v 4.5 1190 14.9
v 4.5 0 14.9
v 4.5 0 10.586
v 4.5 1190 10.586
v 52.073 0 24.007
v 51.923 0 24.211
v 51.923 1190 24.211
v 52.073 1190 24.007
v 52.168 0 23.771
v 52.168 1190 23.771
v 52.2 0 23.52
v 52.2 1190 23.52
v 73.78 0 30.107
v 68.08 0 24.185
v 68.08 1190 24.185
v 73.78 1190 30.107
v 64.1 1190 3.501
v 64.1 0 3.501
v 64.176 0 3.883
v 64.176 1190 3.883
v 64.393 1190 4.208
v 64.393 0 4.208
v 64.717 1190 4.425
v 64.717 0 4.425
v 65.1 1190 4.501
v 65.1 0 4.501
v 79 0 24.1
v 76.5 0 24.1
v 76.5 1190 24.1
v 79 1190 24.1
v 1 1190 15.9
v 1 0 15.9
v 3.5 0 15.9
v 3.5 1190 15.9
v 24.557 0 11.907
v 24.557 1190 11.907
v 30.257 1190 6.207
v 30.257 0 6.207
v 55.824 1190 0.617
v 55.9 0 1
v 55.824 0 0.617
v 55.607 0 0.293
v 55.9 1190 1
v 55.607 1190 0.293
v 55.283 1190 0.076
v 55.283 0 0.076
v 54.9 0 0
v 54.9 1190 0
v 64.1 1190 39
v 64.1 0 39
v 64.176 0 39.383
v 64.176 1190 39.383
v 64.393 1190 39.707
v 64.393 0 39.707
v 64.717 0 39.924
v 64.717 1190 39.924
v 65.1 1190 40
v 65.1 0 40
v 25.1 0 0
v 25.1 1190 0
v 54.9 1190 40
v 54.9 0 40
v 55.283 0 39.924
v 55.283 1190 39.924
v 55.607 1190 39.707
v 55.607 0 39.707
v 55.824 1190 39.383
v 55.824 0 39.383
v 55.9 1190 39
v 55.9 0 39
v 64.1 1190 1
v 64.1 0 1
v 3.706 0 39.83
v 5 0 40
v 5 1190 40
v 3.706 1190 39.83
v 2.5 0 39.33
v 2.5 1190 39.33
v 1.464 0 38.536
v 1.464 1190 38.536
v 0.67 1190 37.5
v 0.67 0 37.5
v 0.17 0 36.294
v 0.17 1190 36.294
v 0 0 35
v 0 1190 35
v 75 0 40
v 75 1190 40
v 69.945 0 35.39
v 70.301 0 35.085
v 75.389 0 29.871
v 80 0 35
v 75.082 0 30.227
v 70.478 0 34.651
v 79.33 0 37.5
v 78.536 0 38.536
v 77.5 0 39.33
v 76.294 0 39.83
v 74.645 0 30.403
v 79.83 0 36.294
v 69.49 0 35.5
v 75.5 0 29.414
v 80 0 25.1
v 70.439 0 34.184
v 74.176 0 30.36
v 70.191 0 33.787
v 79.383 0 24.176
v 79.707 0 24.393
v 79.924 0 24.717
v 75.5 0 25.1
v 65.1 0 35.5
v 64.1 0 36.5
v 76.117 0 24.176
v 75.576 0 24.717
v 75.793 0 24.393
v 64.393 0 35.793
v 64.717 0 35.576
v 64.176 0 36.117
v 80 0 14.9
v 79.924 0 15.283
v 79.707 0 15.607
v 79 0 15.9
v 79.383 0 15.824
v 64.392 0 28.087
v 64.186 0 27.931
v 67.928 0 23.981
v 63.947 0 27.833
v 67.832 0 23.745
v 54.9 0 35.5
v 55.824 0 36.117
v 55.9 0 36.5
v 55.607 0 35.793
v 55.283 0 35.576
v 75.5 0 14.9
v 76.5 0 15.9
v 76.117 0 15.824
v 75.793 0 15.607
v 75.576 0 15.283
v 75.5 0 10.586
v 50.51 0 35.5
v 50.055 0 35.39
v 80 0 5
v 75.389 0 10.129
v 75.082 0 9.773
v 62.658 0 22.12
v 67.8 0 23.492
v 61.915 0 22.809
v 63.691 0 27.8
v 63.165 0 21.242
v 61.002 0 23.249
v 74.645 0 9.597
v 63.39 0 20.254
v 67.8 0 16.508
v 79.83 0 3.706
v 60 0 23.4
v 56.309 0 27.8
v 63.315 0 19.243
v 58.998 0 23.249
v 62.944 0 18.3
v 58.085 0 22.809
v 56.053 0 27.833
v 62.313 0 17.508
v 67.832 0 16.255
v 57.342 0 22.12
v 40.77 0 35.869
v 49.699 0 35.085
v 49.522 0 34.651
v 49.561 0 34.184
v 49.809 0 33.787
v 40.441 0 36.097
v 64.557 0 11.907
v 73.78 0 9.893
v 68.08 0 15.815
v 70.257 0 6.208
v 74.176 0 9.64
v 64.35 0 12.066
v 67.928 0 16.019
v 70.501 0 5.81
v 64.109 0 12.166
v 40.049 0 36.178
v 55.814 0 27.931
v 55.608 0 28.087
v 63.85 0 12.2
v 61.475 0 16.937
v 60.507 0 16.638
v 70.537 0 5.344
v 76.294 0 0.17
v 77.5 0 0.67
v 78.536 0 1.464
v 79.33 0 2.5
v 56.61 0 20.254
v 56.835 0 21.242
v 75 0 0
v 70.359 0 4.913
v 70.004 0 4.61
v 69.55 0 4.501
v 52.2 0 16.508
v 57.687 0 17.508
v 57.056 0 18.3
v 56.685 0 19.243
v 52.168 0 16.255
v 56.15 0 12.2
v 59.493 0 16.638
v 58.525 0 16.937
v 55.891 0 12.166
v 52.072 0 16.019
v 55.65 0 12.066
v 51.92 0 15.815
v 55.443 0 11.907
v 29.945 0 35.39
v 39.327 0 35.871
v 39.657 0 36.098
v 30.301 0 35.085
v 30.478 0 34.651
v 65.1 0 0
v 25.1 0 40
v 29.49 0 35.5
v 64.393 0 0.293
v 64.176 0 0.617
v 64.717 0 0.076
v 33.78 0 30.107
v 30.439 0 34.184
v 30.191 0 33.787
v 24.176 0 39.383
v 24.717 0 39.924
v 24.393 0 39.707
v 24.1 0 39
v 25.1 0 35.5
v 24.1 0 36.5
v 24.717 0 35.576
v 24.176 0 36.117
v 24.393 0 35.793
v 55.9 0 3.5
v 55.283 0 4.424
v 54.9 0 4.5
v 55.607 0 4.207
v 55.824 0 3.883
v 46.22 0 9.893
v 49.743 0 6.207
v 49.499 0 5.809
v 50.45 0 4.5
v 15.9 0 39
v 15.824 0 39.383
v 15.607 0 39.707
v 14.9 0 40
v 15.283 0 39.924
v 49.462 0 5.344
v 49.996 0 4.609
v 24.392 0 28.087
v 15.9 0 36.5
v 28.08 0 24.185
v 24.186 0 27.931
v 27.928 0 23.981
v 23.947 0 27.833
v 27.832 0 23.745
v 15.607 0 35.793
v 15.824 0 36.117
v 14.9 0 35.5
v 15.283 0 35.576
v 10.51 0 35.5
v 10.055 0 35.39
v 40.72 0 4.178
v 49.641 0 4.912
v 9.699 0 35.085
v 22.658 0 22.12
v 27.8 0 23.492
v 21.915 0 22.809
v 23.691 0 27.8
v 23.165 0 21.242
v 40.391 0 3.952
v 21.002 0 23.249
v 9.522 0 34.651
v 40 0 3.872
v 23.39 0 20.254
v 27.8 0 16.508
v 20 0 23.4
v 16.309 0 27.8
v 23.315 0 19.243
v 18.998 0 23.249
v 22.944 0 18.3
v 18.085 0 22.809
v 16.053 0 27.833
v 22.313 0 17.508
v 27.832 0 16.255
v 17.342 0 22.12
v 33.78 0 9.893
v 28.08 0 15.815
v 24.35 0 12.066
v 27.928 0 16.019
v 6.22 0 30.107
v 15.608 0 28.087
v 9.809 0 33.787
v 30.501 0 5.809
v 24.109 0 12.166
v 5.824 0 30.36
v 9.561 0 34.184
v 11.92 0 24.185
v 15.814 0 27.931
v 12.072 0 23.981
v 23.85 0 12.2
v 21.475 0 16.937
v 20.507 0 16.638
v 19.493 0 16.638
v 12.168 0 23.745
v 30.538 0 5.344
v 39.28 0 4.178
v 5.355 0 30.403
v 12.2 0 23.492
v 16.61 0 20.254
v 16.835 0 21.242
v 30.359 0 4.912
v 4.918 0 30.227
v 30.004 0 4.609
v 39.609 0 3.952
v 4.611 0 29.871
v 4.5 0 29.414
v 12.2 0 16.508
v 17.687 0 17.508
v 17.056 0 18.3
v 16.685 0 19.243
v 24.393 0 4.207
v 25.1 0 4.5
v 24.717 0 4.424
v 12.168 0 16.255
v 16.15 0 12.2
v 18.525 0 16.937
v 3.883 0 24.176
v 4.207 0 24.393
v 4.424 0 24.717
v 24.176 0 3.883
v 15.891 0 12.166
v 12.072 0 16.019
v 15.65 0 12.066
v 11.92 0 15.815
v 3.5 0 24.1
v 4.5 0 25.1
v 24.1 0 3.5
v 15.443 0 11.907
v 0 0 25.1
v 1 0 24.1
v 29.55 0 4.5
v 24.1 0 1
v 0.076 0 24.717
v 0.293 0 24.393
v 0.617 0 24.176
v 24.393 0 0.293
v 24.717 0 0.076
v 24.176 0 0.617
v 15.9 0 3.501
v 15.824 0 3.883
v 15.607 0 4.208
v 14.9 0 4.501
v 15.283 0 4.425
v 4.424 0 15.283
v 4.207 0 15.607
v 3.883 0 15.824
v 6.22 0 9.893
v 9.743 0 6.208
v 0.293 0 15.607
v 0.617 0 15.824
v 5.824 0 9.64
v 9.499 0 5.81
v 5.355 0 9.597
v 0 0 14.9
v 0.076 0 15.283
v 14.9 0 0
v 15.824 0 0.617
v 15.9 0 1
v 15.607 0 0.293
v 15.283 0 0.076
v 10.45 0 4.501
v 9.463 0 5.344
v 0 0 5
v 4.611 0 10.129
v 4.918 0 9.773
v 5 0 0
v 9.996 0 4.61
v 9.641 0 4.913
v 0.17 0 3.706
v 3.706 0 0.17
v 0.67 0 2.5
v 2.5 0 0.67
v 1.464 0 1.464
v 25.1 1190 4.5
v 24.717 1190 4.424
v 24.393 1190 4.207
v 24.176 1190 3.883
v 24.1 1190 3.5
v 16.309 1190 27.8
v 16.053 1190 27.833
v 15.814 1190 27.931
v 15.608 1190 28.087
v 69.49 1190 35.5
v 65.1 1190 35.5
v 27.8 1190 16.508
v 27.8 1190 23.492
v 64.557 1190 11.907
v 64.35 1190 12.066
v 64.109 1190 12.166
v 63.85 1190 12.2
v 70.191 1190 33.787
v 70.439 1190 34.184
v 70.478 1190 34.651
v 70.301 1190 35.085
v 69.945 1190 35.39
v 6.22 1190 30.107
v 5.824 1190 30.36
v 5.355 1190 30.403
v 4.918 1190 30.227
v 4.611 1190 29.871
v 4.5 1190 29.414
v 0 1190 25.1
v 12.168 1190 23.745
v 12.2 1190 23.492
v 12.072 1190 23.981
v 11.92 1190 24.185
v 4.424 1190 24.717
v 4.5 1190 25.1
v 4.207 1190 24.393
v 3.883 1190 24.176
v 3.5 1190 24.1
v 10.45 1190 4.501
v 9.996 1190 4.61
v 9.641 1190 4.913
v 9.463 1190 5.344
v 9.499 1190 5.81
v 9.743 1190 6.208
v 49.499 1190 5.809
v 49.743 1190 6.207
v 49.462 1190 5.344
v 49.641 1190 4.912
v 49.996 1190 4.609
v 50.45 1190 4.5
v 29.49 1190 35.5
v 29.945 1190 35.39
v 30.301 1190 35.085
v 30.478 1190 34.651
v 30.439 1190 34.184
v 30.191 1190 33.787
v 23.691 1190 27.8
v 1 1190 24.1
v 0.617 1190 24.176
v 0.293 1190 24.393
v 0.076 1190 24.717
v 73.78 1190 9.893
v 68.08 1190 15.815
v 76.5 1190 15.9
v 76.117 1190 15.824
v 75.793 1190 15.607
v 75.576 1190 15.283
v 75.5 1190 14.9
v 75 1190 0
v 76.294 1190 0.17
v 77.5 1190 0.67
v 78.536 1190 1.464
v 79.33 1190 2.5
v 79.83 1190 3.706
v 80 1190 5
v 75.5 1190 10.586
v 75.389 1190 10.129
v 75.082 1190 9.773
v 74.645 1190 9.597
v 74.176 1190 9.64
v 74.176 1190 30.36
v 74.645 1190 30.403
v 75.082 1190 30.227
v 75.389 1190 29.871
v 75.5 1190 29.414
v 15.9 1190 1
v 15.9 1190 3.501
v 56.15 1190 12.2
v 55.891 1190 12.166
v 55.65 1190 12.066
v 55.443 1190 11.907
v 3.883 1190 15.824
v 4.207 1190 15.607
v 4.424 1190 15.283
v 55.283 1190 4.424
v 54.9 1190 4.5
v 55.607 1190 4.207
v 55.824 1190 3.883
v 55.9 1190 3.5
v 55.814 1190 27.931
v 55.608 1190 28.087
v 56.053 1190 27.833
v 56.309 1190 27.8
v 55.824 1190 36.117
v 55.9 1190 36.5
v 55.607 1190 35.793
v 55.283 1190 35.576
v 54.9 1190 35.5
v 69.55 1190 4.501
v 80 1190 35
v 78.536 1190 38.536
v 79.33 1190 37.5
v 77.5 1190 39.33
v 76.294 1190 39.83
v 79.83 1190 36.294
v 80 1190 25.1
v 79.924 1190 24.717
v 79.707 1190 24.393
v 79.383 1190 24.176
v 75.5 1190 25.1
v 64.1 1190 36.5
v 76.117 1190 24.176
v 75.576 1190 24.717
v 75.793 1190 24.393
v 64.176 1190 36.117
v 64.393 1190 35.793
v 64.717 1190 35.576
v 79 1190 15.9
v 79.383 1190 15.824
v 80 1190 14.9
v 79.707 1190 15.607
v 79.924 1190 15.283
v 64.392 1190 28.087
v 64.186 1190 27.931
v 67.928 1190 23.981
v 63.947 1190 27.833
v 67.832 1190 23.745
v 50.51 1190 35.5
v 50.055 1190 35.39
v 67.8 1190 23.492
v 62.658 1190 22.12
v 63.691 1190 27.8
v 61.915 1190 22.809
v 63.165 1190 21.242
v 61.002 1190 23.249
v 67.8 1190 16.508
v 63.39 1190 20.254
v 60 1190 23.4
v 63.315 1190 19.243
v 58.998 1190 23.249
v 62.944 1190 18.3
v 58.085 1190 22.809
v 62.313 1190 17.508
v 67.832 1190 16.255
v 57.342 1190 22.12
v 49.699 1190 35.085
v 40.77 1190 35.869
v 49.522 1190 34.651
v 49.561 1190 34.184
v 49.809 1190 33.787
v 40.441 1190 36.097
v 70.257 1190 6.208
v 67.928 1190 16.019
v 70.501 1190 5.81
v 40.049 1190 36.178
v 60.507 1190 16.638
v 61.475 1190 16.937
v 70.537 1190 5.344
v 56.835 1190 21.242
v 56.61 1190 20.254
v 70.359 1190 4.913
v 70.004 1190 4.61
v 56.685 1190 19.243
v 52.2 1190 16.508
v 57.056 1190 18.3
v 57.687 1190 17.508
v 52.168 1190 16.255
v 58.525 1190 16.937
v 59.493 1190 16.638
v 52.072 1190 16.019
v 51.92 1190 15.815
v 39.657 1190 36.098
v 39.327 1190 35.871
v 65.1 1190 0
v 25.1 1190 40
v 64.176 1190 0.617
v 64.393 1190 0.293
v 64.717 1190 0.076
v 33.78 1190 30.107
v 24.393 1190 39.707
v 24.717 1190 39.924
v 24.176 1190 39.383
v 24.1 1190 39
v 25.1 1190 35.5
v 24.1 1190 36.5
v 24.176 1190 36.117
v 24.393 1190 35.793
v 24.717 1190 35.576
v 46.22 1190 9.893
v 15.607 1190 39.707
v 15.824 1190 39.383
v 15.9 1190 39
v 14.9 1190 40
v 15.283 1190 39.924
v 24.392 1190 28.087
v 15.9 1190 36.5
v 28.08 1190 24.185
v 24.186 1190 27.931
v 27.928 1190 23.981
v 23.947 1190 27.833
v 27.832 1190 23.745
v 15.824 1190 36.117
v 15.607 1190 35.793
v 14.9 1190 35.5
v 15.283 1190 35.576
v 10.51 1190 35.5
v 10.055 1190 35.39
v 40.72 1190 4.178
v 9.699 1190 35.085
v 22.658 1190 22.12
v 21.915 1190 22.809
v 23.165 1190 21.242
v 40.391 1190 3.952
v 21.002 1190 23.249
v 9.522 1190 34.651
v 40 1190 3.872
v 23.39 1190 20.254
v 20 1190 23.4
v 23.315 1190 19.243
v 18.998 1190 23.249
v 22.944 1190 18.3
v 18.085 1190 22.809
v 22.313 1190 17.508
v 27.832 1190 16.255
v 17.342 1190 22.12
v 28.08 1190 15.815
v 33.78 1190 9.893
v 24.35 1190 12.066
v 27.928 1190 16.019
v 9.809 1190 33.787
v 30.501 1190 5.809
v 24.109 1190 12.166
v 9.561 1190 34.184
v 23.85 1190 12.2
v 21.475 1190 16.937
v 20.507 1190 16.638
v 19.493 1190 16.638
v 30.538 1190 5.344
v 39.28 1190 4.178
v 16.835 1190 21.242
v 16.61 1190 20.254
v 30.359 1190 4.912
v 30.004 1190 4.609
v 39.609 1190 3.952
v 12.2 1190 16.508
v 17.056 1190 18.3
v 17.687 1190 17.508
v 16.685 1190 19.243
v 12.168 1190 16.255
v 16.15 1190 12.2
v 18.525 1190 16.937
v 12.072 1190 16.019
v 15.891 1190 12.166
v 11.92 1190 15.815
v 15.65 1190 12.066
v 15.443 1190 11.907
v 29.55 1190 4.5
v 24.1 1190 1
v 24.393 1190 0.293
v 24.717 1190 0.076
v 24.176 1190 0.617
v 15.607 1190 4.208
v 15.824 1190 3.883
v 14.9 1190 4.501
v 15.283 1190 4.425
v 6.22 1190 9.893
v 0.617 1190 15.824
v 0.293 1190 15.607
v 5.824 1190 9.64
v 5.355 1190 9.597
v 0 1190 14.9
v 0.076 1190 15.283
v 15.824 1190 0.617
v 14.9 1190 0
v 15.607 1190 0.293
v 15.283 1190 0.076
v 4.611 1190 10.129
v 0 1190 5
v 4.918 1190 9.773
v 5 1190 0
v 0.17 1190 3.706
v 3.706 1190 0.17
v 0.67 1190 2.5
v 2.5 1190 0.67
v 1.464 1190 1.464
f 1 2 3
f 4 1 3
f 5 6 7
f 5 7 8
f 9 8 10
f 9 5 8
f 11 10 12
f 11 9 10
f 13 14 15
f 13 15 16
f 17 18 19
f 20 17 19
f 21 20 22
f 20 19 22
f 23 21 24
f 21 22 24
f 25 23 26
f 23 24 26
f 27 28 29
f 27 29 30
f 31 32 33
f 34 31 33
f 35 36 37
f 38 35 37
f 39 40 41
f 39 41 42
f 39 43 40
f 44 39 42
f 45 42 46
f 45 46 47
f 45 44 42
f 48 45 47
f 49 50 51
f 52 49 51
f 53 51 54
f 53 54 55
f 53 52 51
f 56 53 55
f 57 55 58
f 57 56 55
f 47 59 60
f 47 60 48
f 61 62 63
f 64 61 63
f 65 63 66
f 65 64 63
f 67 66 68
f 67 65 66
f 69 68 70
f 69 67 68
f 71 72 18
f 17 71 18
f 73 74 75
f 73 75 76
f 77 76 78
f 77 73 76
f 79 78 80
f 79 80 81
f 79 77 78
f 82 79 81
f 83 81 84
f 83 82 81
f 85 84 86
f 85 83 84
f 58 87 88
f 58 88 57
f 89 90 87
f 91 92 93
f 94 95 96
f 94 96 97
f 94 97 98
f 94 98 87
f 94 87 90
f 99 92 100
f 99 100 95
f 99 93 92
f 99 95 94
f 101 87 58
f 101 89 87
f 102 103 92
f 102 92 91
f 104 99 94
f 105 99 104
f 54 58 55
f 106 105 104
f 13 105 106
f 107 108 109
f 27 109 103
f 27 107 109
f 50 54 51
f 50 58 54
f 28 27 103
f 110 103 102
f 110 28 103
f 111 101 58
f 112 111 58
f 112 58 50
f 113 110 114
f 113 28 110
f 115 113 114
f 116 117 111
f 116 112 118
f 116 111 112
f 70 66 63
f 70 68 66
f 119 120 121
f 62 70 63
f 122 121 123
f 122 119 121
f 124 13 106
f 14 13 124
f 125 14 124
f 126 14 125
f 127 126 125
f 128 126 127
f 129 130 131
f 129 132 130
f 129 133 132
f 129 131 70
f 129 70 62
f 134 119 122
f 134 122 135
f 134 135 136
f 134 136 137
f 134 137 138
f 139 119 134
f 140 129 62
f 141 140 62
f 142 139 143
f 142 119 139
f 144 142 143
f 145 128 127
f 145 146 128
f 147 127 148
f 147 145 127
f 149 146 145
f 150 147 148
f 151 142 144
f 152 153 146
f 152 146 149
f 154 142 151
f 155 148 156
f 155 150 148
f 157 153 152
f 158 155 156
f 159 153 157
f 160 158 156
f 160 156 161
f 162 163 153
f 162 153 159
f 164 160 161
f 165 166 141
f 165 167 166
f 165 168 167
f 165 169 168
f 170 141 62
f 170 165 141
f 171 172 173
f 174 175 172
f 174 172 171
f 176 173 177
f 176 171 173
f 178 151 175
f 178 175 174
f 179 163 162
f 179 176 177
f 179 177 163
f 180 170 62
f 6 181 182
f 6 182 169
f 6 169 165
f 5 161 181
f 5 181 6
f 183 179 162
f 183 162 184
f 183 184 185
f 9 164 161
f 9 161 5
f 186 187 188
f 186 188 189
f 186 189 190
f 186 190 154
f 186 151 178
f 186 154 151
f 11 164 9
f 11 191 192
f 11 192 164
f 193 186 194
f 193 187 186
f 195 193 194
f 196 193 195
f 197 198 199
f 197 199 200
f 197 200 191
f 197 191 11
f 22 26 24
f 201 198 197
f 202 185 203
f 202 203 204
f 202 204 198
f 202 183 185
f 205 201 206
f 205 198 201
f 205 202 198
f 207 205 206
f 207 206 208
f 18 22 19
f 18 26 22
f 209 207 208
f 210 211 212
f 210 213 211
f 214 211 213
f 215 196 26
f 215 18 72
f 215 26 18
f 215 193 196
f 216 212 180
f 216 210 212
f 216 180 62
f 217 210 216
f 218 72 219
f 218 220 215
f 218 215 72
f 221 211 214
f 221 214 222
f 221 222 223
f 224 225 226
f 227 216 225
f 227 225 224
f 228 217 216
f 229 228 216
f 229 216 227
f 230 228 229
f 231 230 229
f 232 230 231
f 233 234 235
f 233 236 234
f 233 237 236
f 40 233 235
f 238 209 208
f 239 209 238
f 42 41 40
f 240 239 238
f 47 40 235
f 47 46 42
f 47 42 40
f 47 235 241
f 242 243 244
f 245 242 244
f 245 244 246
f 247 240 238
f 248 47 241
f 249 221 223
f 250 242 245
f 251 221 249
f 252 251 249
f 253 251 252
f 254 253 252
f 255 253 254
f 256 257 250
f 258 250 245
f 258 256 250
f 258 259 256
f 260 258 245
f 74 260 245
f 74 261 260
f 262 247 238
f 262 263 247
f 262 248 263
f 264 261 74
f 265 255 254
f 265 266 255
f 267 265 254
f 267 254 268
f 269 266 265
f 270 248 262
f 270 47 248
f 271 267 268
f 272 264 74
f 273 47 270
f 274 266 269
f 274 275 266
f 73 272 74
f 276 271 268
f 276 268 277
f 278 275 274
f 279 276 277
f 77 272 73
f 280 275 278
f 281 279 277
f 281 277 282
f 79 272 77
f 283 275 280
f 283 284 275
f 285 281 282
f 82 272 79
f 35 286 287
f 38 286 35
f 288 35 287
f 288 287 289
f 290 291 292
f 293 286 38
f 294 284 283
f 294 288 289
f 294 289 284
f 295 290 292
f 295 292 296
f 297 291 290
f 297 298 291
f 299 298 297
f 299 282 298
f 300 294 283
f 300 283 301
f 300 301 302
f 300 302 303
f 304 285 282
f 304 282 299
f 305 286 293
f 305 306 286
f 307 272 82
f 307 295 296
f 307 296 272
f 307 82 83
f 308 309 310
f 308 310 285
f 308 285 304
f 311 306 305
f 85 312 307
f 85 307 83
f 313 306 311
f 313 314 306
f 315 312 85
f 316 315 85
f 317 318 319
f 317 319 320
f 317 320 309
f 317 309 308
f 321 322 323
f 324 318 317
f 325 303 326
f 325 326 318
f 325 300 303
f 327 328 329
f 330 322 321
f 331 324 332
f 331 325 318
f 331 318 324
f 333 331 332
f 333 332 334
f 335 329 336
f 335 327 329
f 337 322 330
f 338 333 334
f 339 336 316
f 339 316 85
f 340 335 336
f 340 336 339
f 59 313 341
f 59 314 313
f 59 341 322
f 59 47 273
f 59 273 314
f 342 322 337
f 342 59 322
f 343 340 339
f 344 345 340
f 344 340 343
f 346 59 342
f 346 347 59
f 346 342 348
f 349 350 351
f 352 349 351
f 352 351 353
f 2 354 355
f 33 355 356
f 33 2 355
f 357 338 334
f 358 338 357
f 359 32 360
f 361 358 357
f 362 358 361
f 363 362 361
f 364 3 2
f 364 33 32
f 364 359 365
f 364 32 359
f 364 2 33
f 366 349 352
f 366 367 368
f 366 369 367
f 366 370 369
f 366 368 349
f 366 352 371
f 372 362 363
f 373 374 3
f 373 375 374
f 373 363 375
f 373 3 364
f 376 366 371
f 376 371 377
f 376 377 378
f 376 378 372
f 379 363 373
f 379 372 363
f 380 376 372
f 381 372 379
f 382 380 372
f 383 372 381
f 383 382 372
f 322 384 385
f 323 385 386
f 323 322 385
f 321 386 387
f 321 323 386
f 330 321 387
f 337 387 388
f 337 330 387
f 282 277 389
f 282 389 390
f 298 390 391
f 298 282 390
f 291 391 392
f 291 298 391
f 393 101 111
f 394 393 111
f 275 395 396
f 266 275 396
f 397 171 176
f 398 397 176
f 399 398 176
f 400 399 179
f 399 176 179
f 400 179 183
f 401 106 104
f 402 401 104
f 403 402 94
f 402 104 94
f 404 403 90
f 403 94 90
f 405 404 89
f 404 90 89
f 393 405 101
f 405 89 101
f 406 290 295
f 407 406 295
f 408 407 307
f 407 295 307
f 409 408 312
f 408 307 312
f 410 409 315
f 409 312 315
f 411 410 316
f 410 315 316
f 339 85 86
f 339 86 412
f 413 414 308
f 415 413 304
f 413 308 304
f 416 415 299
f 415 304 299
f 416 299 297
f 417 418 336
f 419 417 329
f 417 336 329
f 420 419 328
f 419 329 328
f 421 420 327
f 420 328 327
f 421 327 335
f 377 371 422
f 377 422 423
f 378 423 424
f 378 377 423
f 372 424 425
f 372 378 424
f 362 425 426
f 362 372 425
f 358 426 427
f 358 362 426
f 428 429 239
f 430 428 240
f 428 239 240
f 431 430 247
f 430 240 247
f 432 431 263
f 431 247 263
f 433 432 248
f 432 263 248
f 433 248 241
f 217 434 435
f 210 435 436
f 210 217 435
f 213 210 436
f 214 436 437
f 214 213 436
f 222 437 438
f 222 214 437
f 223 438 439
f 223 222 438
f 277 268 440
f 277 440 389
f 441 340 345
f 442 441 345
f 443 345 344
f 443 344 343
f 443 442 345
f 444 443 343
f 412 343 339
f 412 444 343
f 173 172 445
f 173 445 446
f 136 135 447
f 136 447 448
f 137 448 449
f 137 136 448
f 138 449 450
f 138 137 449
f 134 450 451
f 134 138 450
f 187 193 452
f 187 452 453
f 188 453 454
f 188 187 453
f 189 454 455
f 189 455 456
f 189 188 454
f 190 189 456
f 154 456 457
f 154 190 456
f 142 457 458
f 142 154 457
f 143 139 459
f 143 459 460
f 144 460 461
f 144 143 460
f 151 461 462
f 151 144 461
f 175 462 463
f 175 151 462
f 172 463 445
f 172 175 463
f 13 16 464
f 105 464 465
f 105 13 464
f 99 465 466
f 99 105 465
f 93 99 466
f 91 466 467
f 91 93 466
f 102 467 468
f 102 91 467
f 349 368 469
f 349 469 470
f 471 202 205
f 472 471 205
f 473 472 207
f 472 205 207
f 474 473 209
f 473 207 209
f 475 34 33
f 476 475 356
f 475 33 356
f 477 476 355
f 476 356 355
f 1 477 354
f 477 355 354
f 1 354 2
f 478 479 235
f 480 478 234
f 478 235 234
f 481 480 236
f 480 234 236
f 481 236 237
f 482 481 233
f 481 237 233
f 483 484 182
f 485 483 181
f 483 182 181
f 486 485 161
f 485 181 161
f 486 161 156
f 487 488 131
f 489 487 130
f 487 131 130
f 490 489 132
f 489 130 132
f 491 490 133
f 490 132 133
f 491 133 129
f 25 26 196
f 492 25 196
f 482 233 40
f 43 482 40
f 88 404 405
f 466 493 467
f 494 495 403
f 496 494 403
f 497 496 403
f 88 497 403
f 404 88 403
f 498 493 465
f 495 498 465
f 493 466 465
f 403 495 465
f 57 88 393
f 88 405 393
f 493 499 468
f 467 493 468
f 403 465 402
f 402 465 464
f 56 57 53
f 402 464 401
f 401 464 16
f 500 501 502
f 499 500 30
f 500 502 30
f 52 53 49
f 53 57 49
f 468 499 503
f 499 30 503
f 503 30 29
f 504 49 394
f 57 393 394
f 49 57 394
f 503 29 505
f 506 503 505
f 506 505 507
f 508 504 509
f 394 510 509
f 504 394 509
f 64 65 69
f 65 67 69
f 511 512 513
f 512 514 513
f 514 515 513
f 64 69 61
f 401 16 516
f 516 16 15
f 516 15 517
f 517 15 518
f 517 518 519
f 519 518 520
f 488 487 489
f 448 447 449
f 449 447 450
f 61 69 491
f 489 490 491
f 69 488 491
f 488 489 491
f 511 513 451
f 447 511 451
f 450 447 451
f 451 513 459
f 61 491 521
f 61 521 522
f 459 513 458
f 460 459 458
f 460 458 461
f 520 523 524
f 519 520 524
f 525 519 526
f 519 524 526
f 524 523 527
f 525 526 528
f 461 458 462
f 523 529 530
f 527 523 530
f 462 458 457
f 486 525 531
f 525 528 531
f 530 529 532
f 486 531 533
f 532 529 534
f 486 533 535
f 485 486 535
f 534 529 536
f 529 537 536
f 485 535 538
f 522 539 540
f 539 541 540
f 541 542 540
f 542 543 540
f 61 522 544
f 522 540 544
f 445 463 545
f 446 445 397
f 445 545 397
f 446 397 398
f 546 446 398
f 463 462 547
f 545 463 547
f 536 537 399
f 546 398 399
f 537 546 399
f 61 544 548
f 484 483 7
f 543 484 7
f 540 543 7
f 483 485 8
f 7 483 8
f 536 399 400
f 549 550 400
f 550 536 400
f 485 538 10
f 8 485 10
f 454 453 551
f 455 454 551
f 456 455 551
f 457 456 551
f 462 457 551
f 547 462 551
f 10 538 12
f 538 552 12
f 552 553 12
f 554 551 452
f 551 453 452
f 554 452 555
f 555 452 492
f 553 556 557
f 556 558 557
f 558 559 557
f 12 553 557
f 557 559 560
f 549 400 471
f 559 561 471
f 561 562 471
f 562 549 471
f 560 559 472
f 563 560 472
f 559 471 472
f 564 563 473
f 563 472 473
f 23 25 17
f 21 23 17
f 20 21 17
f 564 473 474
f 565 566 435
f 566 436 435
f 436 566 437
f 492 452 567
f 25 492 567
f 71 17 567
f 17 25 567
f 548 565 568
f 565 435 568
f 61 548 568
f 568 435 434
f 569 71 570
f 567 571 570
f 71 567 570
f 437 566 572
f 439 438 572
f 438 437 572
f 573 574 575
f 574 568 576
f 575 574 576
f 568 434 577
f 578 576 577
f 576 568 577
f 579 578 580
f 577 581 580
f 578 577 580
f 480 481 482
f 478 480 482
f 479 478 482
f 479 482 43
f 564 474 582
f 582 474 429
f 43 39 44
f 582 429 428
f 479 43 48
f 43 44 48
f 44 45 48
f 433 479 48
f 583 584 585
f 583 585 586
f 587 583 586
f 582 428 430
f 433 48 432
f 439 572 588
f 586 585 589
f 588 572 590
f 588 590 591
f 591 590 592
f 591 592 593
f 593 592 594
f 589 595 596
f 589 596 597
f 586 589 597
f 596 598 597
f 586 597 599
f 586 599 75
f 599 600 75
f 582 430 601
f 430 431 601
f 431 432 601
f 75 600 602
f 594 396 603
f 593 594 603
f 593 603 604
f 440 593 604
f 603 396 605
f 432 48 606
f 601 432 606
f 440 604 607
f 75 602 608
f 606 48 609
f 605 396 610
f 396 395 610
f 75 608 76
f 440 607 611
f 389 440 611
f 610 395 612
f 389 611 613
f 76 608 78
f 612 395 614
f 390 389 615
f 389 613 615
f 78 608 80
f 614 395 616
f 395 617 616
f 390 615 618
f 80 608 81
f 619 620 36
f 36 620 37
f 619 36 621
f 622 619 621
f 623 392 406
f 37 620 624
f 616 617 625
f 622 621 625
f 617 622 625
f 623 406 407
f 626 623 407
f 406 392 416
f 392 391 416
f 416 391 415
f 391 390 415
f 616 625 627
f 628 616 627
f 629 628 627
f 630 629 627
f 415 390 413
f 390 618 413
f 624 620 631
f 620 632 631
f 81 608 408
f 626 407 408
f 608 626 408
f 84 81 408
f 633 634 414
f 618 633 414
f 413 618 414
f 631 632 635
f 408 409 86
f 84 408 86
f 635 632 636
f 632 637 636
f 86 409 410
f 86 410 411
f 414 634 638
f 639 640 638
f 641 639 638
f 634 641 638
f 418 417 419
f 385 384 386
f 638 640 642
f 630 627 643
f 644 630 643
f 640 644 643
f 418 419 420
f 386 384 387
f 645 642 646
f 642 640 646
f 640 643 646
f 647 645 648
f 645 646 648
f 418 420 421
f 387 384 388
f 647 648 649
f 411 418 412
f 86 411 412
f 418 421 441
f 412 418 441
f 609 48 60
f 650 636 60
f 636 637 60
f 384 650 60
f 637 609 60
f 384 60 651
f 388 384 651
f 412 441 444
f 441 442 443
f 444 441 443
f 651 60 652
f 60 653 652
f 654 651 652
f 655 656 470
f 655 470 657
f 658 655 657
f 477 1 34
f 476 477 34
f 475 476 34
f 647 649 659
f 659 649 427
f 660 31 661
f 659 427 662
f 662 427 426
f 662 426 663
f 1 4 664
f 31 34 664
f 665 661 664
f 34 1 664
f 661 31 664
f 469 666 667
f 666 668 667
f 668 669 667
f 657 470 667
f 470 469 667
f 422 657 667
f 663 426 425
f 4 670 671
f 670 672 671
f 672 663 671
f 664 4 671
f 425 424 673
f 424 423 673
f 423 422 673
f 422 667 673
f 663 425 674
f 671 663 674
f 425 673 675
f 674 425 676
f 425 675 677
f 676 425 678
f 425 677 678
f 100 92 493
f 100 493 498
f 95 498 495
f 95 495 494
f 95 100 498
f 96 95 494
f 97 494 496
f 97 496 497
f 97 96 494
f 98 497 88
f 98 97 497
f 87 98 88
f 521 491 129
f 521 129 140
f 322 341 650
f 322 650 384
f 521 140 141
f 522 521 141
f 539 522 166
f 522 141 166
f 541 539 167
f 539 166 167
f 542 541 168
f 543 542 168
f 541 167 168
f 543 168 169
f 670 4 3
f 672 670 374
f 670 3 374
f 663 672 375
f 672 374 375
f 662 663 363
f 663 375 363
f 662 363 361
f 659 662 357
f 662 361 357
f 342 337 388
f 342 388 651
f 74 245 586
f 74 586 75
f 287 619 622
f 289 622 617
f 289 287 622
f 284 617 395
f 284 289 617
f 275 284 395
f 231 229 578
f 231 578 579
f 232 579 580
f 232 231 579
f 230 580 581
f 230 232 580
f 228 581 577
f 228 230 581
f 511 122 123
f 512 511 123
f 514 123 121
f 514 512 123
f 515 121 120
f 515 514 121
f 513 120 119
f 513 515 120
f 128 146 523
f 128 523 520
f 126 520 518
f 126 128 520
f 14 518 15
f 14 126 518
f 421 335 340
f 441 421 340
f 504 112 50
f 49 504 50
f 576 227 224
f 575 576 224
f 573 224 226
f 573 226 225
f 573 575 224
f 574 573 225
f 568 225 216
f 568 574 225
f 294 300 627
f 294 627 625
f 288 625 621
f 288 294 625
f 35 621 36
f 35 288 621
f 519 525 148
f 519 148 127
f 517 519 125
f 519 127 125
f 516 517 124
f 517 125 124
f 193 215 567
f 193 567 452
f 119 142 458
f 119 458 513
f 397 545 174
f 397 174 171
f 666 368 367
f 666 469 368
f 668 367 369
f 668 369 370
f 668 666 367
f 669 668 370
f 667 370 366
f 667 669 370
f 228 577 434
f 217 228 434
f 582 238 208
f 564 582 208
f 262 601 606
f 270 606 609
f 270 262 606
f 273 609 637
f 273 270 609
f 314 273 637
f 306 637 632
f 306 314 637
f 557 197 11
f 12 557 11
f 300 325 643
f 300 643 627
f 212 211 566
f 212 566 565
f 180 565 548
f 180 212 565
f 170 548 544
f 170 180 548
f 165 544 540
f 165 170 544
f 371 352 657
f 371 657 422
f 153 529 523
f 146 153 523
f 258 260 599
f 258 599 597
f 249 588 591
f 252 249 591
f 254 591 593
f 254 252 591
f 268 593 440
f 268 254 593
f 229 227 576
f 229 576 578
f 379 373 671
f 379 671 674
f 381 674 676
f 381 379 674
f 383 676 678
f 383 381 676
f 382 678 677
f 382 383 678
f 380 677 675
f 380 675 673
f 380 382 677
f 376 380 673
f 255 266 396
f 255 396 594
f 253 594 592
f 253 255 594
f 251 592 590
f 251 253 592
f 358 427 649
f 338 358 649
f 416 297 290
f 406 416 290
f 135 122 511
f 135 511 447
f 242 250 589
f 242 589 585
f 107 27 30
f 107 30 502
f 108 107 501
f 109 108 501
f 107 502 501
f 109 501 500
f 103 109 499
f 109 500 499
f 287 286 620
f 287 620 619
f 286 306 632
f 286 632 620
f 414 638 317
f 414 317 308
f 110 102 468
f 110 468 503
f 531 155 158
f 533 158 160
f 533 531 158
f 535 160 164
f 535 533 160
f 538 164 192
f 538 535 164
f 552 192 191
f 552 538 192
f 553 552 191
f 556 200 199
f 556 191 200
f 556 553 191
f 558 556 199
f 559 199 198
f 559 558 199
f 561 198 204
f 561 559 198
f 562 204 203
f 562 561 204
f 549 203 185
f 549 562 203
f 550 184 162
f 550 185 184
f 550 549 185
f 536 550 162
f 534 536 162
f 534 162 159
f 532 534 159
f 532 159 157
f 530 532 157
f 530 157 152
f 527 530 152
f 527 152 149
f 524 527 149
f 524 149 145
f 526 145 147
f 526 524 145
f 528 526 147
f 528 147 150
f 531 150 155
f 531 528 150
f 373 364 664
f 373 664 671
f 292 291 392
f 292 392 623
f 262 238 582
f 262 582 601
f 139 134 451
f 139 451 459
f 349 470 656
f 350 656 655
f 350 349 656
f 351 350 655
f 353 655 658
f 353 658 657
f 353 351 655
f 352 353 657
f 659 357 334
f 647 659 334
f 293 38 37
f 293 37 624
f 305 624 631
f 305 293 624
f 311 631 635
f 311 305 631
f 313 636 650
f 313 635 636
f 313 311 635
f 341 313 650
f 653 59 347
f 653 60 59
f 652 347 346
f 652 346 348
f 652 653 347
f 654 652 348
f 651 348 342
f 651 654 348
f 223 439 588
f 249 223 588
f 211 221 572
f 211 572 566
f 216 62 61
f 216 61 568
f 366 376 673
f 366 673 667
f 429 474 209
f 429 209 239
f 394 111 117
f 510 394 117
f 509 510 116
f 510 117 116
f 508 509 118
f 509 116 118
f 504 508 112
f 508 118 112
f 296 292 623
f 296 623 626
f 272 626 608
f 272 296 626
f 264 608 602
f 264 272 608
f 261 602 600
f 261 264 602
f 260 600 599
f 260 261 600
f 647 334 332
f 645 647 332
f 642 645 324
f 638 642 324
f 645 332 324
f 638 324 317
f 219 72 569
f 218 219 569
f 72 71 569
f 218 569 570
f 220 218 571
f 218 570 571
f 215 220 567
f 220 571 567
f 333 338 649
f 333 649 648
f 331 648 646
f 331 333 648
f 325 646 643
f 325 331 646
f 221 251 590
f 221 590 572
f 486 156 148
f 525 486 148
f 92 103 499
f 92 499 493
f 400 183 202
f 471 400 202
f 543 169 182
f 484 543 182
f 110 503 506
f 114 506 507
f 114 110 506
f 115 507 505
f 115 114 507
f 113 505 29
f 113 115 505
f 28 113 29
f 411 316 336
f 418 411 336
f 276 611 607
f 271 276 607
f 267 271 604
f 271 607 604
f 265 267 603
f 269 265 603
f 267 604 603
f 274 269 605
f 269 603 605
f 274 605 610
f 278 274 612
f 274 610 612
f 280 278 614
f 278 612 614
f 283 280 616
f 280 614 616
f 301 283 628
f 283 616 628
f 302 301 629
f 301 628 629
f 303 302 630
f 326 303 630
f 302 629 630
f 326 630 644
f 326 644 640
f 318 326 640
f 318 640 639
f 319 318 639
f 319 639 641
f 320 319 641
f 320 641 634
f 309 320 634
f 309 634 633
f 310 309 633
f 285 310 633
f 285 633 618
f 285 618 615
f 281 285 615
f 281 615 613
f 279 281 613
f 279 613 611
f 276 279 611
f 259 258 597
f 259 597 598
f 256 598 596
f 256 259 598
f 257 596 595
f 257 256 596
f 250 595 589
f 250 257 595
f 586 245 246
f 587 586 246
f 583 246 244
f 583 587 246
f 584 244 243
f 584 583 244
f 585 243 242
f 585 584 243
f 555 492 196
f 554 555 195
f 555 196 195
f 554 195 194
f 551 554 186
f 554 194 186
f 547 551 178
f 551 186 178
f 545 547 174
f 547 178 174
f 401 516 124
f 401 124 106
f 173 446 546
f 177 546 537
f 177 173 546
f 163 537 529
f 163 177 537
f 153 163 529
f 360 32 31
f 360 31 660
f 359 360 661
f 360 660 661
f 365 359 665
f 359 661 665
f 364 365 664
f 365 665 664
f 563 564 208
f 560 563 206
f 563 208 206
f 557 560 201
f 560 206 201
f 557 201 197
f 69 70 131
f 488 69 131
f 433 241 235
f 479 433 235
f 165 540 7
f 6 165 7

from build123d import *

# Parameters (mm, degrees)
BOSS_EXTRUDE1_DEPTH   = 1190
SKETCH3_R             = 3.4
CUT_EXTRUDE1_DEPTH    = 1194.356610574
CUT_EXTRUDE2_DEPTH    = 1194.356610574
FILLET1_R             = 1
FILLET2_R             = 1
FILLET3_R             = 1
CUT_EXTRUDE3_DEPTH    = 1194.356610574
CUT_EXTRUDE4_DEPTH    = 1194.356610574
FILLET4_R             = 1
FILLET5_R             = 1
FILLET6_R             = 1
FILLET7_R             = 1
FILLET8_R             = 1
FILLET9_R             = 1
FILLET10_R            = 1
FILLET11_R            = 1
MIRROR11_COPY_1_DEPTH = 1194.356610574
MIRROR11_COPY_2_DEPTH = 1194.356610574
CUT_EXTRUDE5_DEPTH    = 1194.356610574


with BuildPart() as part:
    # Sketch1 → Boss-Extrude1 (new body)
    with BuildSketch(Plane(origin=(0, 0, 0), x_dir=(1, 0, 0), z_dir=(0, 1, 0))):
        with BuildLine():
            Line((5, 0), (75, 0))
            ThreePointArc((75, 0), (78.535533906, -1.464466094), (80, -5))
            Line((80, -5), (80, -35))
            ThreePointArc((80, -35), (78.535533906, -38.535533906), (75, -40))
            Line((75, -40), (5, -40))
            ThreePointArc((5, -40), (1.464466094, -38.535533906), (0, -35))
            Line((0, -35), (0, -5))
            ThreePointArc((0, -5), (1.464466094, -1.464466094), (5, 0))
        make_face()
    extrude(amount=BOSS_EXTRUDE1_DEPTH)

    # Sketch3 → Cut-Extrude1 (cut, through all)
    with BuildSketch(Plane(origin=(0, 1190, 0), x_dir=(1, 0, 0), z_dir=(0, 1, 0))):
        with Locations(Location((20, -20, 0), (0, 0, 270))):
            Circle(SKETCH3_R)
    cut_extrude1 = extrude(amount=-CUT_EXTRUDE1_DEPTH, mode=Mode.SUBTRACT)

    # Mirror3: Cut-Extrude1 across plane
    add(cut_extrude1.mirror(Plane(origin=(40, 0, 0), x_dir=(0, 0, 1), z_dir=(1, 0, 0))), mode=Mode.SUBTRACT)

    # Sketch7 → Cut-Extrude2 (cut, through all)
    with BuildSketch(Plane(origin=(0, 0, 0), x_dir=(-1, 0, 0), z_dir=(0, -1, 0))):
        with BuildLine():
            Line((-15.9, -40), (-24.1, -40))
            Line((-24.1, -40), (-24.1, -36.5))
            ThreePointArc((-24.1, -36.5), (-24.392893219, -35.792893219), (-25.1, -35.5))
            Line((-25.1, -35.5), (-29.489753594, -35.5))
            ThreePointArc((-29.489753594, -35.5), (-30.415270825, -34.8787055), (-30.190750526, -33.786835712))
            Line((-30.190750526, -33.786835712), (-24.391814382, -28.086835712))
            ThreePointArc((-24.391814382, -28.086835712), (-24.069522951, -27.874482769), (-23.69081745, -27.8))
            Line((-23.69081745, -27.8), (-16.309186536, -27.8))
            ThreePointArc((-16.309186536, -27.8), (-15.930477876, -27.874484063), (-15.608184734, -28.086840499))
            Line((-15.608184734, -28.086840499), (-9.809327805, -33.786840499))
            ThreePointArc((-9.809327805, -33.786840499), (-9.584813669, -34.87870866), (-10.510329607, -35.5))
            Line((-10.510329607, -35.5), (-14.9, -35.5))
            ThreePointArc((-14.9, -35.5), (-15.607106781, -35.792893219), (-15.9, -36.5))
            Line((-15.9, -36.5), (-15.9, -40))
        make_face()
    cut_extrude2 = extrude(amount=-CUT_EXTRUDE2_DEPTH, mode=Mode.SUBTRACT)

    # Fillet1
    fillet1_edges = [part.edges().sort_by_distance(p)[0] for p in [
        (15.9, 595, 40),
        (24.1, 595, 40),
    ]]
    fillet(fillet1_edges, radius=FILLET1_R)

    # Mirror8: Cut-Extrude2 across plane
    add(cut_extrude2.mirror(Plane(origin=(40, 0, 0), x_dir=(0, 0, 1), z_dir=(1, 0, 0))), mode=Mode.SUBTRACT)

    # Fillet2
    fillet2_edges = [part.edges().sort_by_distance(p)[0] for p in [
        (55.9, 595, 40),
    ]]
    fillet(fillet2_edges, radius=FILLET2_R)

    # Fillet3
    fillet3_edges = [part.edges().sort_by_distance(p)[0] for p in [
        (64.1, 595, 40),
    ]]
    fillet(fillet3_edges, radius=FILLET3_R)

    # Sketch9 → Cut-Extrude3 (cut, through all)
    with BuildSketch(Plane(origin=(0, 0, 0), x_dir=(1, 0, 0), z_dir=(0, 1, 0))):
        with BuildLine():
            Line((14.899846923, -4.500713815), (10.450461284, -4.500713815))
            ThreePointArc((10.450461284, -4.500713815), (9.526581751, -5.118030383), (9.743354502, -6.207820596))
            Line((9.743354502, -6.207820596), (15.442640687, -11.907106781))
            ThreePointArc((15.442640687, -11.907106781), (15.767064036, -12.123879533), (16.149747468, -12.2))
            Line((16.149747468, -12.2), (23.850252532, -12.2))
            ThreePointArc((23.850252532, -12.2), (24.232935964, -12.123879533), (24.557359313, -11.907106781))
            Line((24.557359313, -11.907106781), (30.257359313, -6.207106781))
            ThreePointArc((30.257359313, -6.207106781), (30.474132064, -5.117316568), (29.550252532, -4.5))
            Line((29.550252532, -4.5), (25.099846964, -4.5))
            ThreePointArc((25.099846964, -4.5), (24.392724723, -4.207091321), (24.099846965, -3.499956273))
            Line((24.099846965, -3.499956273), (24.100000008, 0))
            Line((24.100000008, 0), (15.9, 0))
            Line((15.9, 0), (15.899846922, -3.500757542))
            ThreePointArc((15.899846922, -3.500757542), (15.606938244, -4.207836056), (14.899846923, -4.500713815))
        make_face()
    cut_extrude3 = extrude(amount=CUT_EXTRUDE3_DEPTH, mode=Mode.SUBTRACT)

    # Mirror9: Cut-Extrude3 across plane
    add(cut_extrude3.mirror(Plane(origin=(40, 0, 0), x_dir=(0, 0, 1), z_dir=(1, 0, 0))), mode=Mode.SUBTRACT)

    # Sketch10 → Cut-Extrude4 (cut, through all)
    with BuildSketch(Plane(origin=(0, 0, 0), x_dir=(1, 0, 0), z_dir=(0, 1, 0))):
        with BuildLine():
            Line((4.5, -14.9), (4.5, -10.58605332))
            ThreePointArc((4.5, -10.58605332), (5.126159695, -9.658560233), (6.220486853, -9.892584724))
            Line((6.220486853, -9.892584724), (11.920486853, -15.814662646))
            ThreePointArc((11.920486853, -15.814662646), (12.127493087, -16.134290938), (12.2, -16.508131242))
            Line((12.2, -16.508131242), (12.2, -23.491868758))
            ThreePointArc((12.2, -23.491868758), (12.127493087, -23.865709062), (11.920486853, -24.185337354))
            Line((11.920486853, -24.185337354), (6.220486853, -30.107415276))
            ThreePointArc((6.220486853, -30.107415276), (5.126159695, -30.341439767), (4.5, -29.41394668))
            Line((4.5, -29.41394668), (4.5, -25.1))
            ThreePointArc((4.5, -25.1), (4.207106781, -24.392893219), (3.5, -24.1))
            Line((3.5, -24.1), (0, -24.1))
            Line((0, -24.1), (0, -15.9))
            Line((0, -15.9), (3.5, -15.9))
            ThreePointArc((3.5, -15.9), (4.207106781, -15.607106781), (4.5, -14.9))
        make_face()
    cut_extrude4 = extrude(amount=CUT_EXTRUDE4_DEPTH, mode=Mode.SUBTRACT)

    # Fillet4
    fillet4_edges = [part.edges().sort_by_distance(p)[0] for p in [
        (24.100000008, 595, 0),
    ]]
    fillet(fillet4_edges, radius=FILLET4_R)

    # Fillet5
    fillet5_edges = [part.edges().sort_by_distance(p)[0] for p in [
        (64.1, 595, 0),
    ]]
    fillet(fillet5_edges, radius=FILLET5_R)

    # Fillet6
    fillet6_edges = [part.edges().sort_by_distance(p)[0] for p in [
        (55.899999992, 595, 0),
    ]]
    fillet(fillet6_edges, radius=FILLET6_R)

    # Fillet7
    fillet7_edges = [part.edges().sort_by_distance(p)[0] for p in [
        (15.9, 595, 0),
    ]]
    fillet(fillet7_edges, radius=FILLET7_R)

    # Fillet8
    fillet8_edges = [part.edges().sort_by_distance(p)[0] for p in [
        (0, 595, 24.1),
    ]]
    fillet(fillet8_edges, radius=FILLET8_R)

    # Fillet9
    fillet9_edges = [part.edges().sort_by_distance(p)[0] for p in [
        (0, 595, 15.9),
    ]]
    fillet(fillet9_edges, radius=FILLET9_R)

    # Mirror10: Cut-Extrude4 across plane
    add(cut_extrude4.mirror(Plane(origin=(40, 0, 0), x_dir=(0, 0, 1), z_dir=(1, 0, 0))), mode=Mode.SUBTRACT)

    # Fillet10
    fillet10_edges = [part.edges().sort_by_distance(p)[0] for p in [
        (80, 595, 15.9),
    ]]
    fillet(fillet10_edges, radius=FILLET10_R)

    # Fillet11
    fillet11_edges = [part.edges().sort_by_distance(p)[0] for p in [
        (80, 595, 24.1),
    ]]
    fillet(fillet11_edges, radius=FILLET11_R)

    # Mirror11 copy 1 sketch → Mirror11 copy 1 (cut, through all)
    with BuildSketch(Plane(origin=(40, 0, 0), x_dir=(1, 0, 0), z_dir=(0, 1, 0))):
        with BuildLine():
            Line((4.5, -14.9), (4.5, -10.58605332))
            ThreePointArc((4.5, -10.58605332), (5.126159695, -9.658560233), (6.220486853, -9.892584724))
            Line((6.220486853, -9.892584724), (11.920486853, -15.814662646))
            ThreePointArc((11.920486853, -15.814662646), (12.127493087, -16.134290938), (12.2, -16.508131242))
            Line((12.2, -16.508131242), (12.2, -23.491868758))
            ThreePointArc((12.2, -23.491868758), (12.127493087, -23.865709062), (11.920486853, -24.185337354))
            Line((11.920486853, -24.185337354), (6.220486853, -30.107415276))
            ThreePointArc((6.220486853, -30.107415276), (5.126159695, -30.341439767), (4.5, -29.41394668))
            Line((4.5, -29.41394668), (4.5, -25.1))
            ThreePointArc((4.5, -25.1), (4.207106781, -24.392893219), (3.5, -24.1))
            Line((3.5, -24.1), (0, -24.1))
            Line((0, -24.1), (0, -15.9))
            Line((0, -15.9), (3.5, -15.9))
            ThreePointArc((3.5, -15.9), (4.207106781, -15.607106781), (4.5, -14.9))
        make_face()
    extrude(amount=MIRROR11_COPY_1_DEPTH, mode=Mode.SUBTRACT)

    # Mirror11 copy 2 sketch → Mirror11 copy 2 (cut, through all)
    with BuildSketch(Plane(origin=(120, 0, 0), x_dir=(-1, 0, 0), z_dir=(0, 1, 0))):
        with BuildLine():
            Line((4.5, 14.9), (4.5, 10.58605332))
            ThreePointArc((4.5, 10.58605332), (5.126159695, 9.658560233), (6.220486853, 9.892584724))
            Line((6.220486853, 9.892584724), (11.920486853, 15.814662646))
            ThreePointArc((11.920486853, 15.814662646), (12.127493087, 16.134290938), (12.2, 16.508131242))
            Line((12.2, 16.508131242), (12.2, 23.491868758))
            ThreePointArc((12.2, 23.491868758), (12.127493087, 23.865709062), (11.920486853, 24.185337354))
            Line((11.920486853, 24.185337354), (6.220486853, 30.107415276))
            ThreePointArc((6.220486853, 30.107415276), (5.126159695, 30.341439767), (4.5, 29.41394668))
            Line((4.5, 29.41394668), (4.5, 25.1))
            ThreePointArc((4.5, 25.1), (4.207106781, 24.392893219), (3.5, 24.1))
            Line((3.5, 24.1), (0, 24.1))
            Line((0, 24.1), (0, 15.9))
            Line((0, 15.9), (3.5, 15.9))
            ThreePointArc((3.5, 15.9), (4.207106781, 15.607106781), (4.5, 14.9))
        make_face()
    extrude(amount=MIRROR11_COPY_2_DEPTH, mode=Mode.SUBTRACT)

    # Mirror12: Cut-Extrude4 across plane
    add(cut_extrude4.mirror(Plane.ZY.offset(-20)), mode=Mode.SUBTRACT)

    # Sketch12 → Cut-Extrude5 (cut, through all)
    with BuildSketch(Plane(origin=(0, 0, 0), x_dir=(-1, 0, 0), z_dir=(0, -1, 0))):
        with BuildLine():
            Line((-28.079513147, -24.185337354), (-39.327067998, -35.871108628))
            ThreePointArc((-39.327067998, -35.871108628), (-40.049082116, -36.177638866), (-40.770156561, -35.868904648))
            Line((-40.770156561, -35.868904648), (-51.922601709, -24.210885791))
            ThreePointArc((-51.922601709, -24.210885791), (-52.128062958, -23.892044517), (-52.2, -23.519621175))
            Line((-52.2, -23.519621175), (-52.2, -16.508131242))
            ThreePointArc((-52.2, -16.508131242), (-52.127493087, -16.134290938), (-51.920486853, -15.814662646))
            Line((-51.920486853, -15.814662646), (-40.720486853, -4.17829901))
            ThreePointArc((-40.720486853, -4.17829901), (-40, -3.871767606), (-39.279513147, -4.17829901))
            Line((-39.279513147, -4.17829901), (-28.079513147, -15.814662646))
            ThreePointArc((-28.079513147, -15.814662646), (-27.872506913, -16.134290938), (-27.8, -16.508131242))
            Line((-27.8, -16.508131242), (-27.8, -23.491868758))
            ThreePointArc((-27.8, -23.491868758), (-27.872506913, -23.865709062), (-28.079513147, -24.185337354))
        make_face()
    extrude(amount=-CUT_EXTRUDE5_DEPTH, mode=Mode.SUBTRACT)


solid = part.part
